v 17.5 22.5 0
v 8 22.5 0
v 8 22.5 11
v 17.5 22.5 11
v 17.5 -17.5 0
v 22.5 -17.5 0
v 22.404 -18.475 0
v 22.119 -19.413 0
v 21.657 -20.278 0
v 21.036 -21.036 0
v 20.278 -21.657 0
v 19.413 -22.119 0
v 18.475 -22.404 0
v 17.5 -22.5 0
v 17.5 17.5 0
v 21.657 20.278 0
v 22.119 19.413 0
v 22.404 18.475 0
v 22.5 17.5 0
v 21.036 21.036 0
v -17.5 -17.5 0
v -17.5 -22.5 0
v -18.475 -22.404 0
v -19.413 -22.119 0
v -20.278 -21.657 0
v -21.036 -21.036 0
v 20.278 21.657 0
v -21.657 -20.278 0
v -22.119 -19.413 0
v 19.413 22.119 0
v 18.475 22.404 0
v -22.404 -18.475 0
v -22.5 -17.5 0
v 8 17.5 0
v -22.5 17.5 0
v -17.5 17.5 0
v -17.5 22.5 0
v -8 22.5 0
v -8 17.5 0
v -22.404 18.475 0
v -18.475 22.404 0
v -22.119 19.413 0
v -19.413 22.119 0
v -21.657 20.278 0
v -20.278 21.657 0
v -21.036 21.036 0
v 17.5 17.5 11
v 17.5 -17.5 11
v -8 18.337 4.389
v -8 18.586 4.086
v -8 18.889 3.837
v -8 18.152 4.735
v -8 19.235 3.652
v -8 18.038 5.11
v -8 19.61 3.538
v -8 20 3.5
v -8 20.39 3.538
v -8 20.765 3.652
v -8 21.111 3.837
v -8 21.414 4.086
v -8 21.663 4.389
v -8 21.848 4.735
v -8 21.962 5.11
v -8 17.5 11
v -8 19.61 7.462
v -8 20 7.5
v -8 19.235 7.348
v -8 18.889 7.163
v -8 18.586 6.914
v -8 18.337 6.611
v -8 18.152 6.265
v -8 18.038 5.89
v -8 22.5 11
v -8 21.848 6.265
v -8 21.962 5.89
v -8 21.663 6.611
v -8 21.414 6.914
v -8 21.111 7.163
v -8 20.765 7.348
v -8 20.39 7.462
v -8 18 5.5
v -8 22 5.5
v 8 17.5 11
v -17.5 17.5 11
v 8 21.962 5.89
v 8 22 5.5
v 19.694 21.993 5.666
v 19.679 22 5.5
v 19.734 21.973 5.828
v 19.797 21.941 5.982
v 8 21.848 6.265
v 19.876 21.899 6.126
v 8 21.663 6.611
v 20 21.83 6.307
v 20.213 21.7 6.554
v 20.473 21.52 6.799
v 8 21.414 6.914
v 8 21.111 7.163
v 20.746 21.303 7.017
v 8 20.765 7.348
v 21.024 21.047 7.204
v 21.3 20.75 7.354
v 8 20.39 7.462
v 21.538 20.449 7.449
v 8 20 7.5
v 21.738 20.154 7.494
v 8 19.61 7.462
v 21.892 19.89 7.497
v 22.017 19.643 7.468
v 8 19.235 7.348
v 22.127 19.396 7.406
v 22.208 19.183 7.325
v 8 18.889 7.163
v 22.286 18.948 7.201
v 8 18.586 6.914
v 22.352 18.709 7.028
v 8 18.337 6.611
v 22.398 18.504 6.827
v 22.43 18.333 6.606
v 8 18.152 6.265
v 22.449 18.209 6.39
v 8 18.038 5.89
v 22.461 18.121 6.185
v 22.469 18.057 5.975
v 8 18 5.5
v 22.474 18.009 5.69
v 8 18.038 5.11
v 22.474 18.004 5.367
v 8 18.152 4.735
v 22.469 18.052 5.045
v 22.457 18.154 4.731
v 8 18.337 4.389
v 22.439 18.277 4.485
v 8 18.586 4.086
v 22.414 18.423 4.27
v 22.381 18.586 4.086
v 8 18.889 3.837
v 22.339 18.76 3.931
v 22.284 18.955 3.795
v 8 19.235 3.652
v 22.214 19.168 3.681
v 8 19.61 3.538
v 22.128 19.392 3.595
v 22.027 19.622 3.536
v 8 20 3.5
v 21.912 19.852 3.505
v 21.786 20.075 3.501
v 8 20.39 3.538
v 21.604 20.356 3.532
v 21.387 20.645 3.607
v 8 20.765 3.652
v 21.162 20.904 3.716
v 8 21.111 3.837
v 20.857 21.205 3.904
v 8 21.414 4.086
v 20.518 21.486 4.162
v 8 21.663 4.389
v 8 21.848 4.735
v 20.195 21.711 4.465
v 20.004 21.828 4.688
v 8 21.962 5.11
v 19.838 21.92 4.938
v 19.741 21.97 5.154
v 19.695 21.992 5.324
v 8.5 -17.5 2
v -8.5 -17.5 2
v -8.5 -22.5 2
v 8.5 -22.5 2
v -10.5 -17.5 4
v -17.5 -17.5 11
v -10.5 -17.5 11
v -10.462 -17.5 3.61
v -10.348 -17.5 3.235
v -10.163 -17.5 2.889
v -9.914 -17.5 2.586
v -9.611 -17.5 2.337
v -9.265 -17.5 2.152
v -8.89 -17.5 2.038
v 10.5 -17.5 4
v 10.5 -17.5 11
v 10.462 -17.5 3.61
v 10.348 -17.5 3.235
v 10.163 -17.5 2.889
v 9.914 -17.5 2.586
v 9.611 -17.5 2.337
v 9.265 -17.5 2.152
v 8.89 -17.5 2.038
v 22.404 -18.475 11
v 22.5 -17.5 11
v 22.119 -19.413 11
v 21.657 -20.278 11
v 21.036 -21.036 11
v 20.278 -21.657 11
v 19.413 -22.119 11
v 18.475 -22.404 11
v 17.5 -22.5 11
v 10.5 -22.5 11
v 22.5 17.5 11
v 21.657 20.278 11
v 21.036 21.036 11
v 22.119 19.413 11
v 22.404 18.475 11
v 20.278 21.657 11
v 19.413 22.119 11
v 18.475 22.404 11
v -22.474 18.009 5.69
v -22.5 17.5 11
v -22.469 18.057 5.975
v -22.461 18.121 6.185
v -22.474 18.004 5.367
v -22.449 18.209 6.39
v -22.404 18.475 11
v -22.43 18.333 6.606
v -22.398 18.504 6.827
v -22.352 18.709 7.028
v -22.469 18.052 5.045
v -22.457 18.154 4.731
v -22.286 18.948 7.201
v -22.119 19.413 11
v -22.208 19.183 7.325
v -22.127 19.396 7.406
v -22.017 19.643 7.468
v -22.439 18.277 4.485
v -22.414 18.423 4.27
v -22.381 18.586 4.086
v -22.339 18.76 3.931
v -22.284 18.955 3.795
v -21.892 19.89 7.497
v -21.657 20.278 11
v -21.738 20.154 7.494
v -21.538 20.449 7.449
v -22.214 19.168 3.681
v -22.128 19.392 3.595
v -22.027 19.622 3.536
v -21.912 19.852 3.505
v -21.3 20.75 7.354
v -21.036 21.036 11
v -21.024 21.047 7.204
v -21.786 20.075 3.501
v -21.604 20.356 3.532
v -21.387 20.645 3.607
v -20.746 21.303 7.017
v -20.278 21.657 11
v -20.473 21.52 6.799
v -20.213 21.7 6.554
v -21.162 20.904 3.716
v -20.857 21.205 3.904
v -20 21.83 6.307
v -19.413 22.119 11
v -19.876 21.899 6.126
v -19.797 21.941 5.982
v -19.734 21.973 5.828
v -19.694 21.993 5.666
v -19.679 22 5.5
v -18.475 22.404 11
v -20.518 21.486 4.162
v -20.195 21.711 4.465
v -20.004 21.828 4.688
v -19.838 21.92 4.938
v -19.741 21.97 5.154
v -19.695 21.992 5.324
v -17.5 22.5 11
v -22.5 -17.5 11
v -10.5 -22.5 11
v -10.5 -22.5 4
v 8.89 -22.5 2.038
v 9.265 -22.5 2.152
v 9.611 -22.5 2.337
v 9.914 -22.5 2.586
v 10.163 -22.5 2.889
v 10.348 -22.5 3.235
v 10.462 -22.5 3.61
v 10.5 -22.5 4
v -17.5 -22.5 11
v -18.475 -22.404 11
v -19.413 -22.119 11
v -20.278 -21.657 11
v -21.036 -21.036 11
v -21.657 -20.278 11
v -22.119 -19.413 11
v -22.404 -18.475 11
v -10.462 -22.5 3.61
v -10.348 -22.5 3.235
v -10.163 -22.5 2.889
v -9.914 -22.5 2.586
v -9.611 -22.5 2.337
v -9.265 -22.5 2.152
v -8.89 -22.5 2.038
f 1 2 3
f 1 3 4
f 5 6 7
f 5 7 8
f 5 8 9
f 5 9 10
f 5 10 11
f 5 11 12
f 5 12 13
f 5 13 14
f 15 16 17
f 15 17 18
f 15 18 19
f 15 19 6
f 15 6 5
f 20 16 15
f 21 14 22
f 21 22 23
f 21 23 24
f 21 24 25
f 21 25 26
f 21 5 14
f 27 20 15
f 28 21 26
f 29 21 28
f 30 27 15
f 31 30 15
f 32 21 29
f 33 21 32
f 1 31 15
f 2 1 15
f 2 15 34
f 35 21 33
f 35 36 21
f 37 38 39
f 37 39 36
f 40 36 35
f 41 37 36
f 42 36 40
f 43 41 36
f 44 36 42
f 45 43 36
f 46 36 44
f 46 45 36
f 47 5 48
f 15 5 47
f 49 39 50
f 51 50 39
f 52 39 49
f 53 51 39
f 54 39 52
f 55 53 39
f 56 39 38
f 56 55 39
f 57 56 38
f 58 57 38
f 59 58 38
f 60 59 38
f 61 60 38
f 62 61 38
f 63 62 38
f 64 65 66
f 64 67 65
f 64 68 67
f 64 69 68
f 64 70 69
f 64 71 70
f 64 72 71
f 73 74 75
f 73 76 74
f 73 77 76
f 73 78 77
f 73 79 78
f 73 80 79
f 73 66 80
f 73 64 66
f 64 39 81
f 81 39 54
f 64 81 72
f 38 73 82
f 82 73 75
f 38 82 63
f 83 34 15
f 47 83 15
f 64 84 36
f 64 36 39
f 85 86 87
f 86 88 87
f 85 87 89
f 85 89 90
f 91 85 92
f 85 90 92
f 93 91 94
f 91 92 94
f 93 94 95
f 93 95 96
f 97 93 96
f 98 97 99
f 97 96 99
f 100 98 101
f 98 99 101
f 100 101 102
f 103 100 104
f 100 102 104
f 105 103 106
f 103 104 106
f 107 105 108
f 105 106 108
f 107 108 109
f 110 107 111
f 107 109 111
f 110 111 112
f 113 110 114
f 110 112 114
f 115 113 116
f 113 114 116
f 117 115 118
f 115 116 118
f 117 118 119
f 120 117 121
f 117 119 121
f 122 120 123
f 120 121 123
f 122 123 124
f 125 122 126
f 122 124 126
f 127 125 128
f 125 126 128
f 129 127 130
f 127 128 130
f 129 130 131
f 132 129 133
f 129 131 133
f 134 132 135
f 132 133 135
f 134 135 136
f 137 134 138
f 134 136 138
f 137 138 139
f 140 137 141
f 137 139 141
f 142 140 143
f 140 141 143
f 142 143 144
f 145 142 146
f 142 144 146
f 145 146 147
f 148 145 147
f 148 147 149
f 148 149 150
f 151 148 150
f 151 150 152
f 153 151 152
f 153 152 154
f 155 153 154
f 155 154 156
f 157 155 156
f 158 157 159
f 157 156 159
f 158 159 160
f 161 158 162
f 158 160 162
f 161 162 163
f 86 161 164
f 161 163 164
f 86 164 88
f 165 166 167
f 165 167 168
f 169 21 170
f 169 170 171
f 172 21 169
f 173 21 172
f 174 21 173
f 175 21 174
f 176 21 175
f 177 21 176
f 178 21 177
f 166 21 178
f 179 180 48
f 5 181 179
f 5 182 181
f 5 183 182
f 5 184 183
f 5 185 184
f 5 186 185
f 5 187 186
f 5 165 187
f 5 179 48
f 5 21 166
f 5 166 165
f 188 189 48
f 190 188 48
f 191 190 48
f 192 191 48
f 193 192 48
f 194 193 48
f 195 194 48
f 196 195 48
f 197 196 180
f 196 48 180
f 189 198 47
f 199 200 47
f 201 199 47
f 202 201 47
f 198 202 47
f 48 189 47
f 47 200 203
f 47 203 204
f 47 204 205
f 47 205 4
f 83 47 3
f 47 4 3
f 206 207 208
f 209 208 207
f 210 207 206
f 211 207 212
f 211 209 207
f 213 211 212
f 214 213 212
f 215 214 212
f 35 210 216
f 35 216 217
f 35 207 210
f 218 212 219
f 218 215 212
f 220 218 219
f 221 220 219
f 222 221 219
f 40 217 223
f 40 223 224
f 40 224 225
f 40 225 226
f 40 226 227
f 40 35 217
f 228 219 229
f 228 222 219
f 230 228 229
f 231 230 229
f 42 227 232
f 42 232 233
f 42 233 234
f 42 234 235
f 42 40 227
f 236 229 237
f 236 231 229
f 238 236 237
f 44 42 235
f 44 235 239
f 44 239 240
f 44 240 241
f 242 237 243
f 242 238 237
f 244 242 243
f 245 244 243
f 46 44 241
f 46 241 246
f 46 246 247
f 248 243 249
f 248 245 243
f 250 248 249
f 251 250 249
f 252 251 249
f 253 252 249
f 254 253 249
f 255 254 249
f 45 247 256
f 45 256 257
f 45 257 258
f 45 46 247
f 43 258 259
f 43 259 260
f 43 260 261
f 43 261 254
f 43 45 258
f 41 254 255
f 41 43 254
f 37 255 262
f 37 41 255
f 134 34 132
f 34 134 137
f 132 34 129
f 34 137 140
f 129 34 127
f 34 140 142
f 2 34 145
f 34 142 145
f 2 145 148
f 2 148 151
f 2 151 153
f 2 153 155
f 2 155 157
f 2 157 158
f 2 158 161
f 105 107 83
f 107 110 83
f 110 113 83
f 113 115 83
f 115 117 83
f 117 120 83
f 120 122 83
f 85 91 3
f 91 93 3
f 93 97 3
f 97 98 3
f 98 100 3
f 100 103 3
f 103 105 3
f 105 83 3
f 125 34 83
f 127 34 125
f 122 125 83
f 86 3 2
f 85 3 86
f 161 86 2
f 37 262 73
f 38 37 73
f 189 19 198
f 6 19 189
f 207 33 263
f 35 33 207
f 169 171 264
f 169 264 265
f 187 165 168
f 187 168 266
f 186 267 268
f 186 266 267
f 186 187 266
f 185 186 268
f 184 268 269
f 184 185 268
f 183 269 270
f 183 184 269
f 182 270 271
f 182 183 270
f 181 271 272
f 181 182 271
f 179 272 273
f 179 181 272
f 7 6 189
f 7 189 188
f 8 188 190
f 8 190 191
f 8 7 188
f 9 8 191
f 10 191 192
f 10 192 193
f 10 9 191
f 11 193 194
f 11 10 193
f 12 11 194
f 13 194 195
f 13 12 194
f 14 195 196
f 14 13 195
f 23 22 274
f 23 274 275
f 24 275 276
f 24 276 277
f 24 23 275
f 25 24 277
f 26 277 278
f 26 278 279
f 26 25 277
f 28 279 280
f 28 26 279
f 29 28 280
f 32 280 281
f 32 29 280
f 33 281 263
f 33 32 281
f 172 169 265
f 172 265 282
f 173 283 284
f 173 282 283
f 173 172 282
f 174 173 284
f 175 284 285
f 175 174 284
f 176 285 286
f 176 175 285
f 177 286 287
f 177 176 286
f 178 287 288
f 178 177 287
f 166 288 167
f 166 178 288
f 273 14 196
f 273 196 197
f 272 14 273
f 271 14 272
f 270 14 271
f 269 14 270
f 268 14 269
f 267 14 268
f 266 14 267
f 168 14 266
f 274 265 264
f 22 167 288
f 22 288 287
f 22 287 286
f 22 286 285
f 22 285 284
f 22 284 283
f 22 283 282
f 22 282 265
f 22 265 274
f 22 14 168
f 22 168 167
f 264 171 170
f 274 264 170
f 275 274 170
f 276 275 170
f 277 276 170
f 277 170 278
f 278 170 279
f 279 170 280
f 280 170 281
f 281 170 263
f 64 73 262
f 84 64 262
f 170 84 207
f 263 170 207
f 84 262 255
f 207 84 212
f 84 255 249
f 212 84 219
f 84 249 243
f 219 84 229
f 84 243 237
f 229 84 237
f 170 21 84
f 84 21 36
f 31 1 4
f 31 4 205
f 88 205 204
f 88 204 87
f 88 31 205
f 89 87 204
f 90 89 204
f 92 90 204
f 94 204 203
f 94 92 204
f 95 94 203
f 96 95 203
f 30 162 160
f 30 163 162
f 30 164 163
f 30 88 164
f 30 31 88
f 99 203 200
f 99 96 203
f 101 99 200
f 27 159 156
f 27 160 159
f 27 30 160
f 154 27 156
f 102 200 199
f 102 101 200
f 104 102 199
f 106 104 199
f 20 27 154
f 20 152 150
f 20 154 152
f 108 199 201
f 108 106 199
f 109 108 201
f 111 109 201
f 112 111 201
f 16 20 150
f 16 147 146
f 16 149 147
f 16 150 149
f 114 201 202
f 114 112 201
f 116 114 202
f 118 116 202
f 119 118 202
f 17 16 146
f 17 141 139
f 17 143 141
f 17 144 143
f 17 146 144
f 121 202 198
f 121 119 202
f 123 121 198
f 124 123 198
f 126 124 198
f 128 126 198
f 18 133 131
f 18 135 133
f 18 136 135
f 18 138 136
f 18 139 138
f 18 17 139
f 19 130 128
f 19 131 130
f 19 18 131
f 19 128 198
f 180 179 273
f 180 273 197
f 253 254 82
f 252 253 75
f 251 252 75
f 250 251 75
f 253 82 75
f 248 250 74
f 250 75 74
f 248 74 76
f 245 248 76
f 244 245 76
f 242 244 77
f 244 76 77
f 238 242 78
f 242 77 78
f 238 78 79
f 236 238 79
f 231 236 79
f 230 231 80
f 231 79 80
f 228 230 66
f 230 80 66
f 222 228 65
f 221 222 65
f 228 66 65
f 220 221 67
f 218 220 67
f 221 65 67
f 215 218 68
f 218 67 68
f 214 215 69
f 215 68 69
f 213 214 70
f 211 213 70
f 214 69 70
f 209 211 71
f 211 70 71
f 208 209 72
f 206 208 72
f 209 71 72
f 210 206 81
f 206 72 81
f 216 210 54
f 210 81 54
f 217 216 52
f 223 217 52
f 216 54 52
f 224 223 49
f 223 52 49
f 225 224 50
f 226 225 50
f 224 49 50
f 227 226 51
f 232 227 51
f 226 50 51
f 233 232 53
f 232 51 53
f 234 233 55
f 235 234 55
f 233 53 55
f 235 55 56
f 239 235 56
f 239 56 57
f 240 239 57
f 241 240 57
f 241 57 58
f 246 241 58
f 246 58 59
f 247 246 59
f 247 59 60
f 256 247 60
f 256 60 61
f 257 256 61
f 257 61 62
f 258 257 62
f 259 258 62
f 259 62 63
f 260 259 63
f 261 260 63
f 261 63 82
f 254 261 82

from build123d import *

# Parameters (mm, degrees)
ESQUISSE1_W                  = 35
ESQUISSE1_H                  = 35
BOSS_EXTRU_1_DEPTH           = 11
ESQUISSE2_W                  = 16
ESQUISSE2_H                  = 10
ENL_V_MAT_EXTRU_1_DEPTH      = 34.667491739
ESQUISSE3_R                  = 2
ENL_V_MAT_EXTRU_2_DEPTH      = 50
ENL_V_MAT_EXTRU_3_DEPTH      = 52.500000152
ENL_V_MAT_EXTRU_3_DEPTH_BACK = 40


with BuildPart() as part:
    # Esquisse1 → Boss.-Extru.1 (new body)
    with BuildSketch(Plane.XY):
        with BuildLine():
            Line((17.5, -22.5), (-17.5, -22.5))
            ThreePointArc((-17.5, -22.5), (-21.035533906, -21.035533906), (-22.5, -17.5))
            Line((-22.5, -17.5), (-22.5, 17.5))
            ThreePointArc((-22.5, 17.5), (-21.035533906, 21.035533906), (-17.5, 22.5))
            Line((-17.5, 22.5), (17.5, 22.5))
            ThreePointArc((17.5, 22.5), (21.035533906, 21.035533906), (22.5, 17.5))
            Line((22.5, 17.5), (22.5, -17.5))
            ThreePointArc((22.5, -17.5), (21.035533906, -21.035533906), (17.5, -22.5))
        make_face()
        Rectangle(ESQUISSE1_W, ESQUISSE1_H, mode=Mode.SUBTRACT)
    extrude(amount=BOSS_EXTRU_1_DEPTH)

    # Esquisse2 → Enlèv. mat.-Extru.1 (cut, through all)
    with BuildSketch(Plane.XY.offset(11)):
        with Locations((0, 20.5)):
            Rectangle(ESQUISSE2_W, ESQUISSE2_H)
    extrude(amount=-ENL_V_MAT_EXTRU_1_DEPTH, mode=Mode.SUBTRACT)

    # Esquisse3 → Enlèv. mat.-Extru.2 (cut, symmetric)
    with BuildSketch(Plane(origin=(-8, 0, 0), x_dir=(0, 0, -1), z_dir=(1, 0, 0))):
        with Locations(Location((-5.5, 20, 0), (0, 0, 90))):
            Circle(ESQUISSE3_R)
    extrude(amount=ENL_V_MAT_EXTRU_2_DEPTH, both=True, mode=Mode.SUBTRACT)

    # Esquisse4 → Enlèv. mat.-Extru.3 (cut, two sides: drawn at the far end of the back side and taken through both)
    with BuildSketch(Plane.XZ.offset(22.5).offset(-ENL_V_MAT_EXTRU_3_DEPTH_BACK)):
        with BuildLine():
            Line((10.5, 11), (0, 11))
            Line((0, 11), (0, 2))
            Line((0, 2), (8.5, 2))
            ThreePointArc((8.5, 2), (9.914213562, 2.585786438), (10.5, 4))
            Line((10.5, 4), (10.5, 11))
        make_face()
        with BuildLine():
            Line((0, 11), (-10.5, 11))
            Line((-10.5, 11), (-10.5, 4))
            ThreePointArc((-10.5, 4), (-9.914213562, 2.585786438), (-8.5, 2))
            Line((-8.5, 2), (0, 2))
            Line((0, 2), (0, 11))
        make_face()
    extrude(amount=ENL_V_MAT_EXTRU_3_DEPTH + ENL_V_MAT_EXTRU_3_DEPTH_BACK, mode=Mode.SUBTRACT)


solid = part.part
